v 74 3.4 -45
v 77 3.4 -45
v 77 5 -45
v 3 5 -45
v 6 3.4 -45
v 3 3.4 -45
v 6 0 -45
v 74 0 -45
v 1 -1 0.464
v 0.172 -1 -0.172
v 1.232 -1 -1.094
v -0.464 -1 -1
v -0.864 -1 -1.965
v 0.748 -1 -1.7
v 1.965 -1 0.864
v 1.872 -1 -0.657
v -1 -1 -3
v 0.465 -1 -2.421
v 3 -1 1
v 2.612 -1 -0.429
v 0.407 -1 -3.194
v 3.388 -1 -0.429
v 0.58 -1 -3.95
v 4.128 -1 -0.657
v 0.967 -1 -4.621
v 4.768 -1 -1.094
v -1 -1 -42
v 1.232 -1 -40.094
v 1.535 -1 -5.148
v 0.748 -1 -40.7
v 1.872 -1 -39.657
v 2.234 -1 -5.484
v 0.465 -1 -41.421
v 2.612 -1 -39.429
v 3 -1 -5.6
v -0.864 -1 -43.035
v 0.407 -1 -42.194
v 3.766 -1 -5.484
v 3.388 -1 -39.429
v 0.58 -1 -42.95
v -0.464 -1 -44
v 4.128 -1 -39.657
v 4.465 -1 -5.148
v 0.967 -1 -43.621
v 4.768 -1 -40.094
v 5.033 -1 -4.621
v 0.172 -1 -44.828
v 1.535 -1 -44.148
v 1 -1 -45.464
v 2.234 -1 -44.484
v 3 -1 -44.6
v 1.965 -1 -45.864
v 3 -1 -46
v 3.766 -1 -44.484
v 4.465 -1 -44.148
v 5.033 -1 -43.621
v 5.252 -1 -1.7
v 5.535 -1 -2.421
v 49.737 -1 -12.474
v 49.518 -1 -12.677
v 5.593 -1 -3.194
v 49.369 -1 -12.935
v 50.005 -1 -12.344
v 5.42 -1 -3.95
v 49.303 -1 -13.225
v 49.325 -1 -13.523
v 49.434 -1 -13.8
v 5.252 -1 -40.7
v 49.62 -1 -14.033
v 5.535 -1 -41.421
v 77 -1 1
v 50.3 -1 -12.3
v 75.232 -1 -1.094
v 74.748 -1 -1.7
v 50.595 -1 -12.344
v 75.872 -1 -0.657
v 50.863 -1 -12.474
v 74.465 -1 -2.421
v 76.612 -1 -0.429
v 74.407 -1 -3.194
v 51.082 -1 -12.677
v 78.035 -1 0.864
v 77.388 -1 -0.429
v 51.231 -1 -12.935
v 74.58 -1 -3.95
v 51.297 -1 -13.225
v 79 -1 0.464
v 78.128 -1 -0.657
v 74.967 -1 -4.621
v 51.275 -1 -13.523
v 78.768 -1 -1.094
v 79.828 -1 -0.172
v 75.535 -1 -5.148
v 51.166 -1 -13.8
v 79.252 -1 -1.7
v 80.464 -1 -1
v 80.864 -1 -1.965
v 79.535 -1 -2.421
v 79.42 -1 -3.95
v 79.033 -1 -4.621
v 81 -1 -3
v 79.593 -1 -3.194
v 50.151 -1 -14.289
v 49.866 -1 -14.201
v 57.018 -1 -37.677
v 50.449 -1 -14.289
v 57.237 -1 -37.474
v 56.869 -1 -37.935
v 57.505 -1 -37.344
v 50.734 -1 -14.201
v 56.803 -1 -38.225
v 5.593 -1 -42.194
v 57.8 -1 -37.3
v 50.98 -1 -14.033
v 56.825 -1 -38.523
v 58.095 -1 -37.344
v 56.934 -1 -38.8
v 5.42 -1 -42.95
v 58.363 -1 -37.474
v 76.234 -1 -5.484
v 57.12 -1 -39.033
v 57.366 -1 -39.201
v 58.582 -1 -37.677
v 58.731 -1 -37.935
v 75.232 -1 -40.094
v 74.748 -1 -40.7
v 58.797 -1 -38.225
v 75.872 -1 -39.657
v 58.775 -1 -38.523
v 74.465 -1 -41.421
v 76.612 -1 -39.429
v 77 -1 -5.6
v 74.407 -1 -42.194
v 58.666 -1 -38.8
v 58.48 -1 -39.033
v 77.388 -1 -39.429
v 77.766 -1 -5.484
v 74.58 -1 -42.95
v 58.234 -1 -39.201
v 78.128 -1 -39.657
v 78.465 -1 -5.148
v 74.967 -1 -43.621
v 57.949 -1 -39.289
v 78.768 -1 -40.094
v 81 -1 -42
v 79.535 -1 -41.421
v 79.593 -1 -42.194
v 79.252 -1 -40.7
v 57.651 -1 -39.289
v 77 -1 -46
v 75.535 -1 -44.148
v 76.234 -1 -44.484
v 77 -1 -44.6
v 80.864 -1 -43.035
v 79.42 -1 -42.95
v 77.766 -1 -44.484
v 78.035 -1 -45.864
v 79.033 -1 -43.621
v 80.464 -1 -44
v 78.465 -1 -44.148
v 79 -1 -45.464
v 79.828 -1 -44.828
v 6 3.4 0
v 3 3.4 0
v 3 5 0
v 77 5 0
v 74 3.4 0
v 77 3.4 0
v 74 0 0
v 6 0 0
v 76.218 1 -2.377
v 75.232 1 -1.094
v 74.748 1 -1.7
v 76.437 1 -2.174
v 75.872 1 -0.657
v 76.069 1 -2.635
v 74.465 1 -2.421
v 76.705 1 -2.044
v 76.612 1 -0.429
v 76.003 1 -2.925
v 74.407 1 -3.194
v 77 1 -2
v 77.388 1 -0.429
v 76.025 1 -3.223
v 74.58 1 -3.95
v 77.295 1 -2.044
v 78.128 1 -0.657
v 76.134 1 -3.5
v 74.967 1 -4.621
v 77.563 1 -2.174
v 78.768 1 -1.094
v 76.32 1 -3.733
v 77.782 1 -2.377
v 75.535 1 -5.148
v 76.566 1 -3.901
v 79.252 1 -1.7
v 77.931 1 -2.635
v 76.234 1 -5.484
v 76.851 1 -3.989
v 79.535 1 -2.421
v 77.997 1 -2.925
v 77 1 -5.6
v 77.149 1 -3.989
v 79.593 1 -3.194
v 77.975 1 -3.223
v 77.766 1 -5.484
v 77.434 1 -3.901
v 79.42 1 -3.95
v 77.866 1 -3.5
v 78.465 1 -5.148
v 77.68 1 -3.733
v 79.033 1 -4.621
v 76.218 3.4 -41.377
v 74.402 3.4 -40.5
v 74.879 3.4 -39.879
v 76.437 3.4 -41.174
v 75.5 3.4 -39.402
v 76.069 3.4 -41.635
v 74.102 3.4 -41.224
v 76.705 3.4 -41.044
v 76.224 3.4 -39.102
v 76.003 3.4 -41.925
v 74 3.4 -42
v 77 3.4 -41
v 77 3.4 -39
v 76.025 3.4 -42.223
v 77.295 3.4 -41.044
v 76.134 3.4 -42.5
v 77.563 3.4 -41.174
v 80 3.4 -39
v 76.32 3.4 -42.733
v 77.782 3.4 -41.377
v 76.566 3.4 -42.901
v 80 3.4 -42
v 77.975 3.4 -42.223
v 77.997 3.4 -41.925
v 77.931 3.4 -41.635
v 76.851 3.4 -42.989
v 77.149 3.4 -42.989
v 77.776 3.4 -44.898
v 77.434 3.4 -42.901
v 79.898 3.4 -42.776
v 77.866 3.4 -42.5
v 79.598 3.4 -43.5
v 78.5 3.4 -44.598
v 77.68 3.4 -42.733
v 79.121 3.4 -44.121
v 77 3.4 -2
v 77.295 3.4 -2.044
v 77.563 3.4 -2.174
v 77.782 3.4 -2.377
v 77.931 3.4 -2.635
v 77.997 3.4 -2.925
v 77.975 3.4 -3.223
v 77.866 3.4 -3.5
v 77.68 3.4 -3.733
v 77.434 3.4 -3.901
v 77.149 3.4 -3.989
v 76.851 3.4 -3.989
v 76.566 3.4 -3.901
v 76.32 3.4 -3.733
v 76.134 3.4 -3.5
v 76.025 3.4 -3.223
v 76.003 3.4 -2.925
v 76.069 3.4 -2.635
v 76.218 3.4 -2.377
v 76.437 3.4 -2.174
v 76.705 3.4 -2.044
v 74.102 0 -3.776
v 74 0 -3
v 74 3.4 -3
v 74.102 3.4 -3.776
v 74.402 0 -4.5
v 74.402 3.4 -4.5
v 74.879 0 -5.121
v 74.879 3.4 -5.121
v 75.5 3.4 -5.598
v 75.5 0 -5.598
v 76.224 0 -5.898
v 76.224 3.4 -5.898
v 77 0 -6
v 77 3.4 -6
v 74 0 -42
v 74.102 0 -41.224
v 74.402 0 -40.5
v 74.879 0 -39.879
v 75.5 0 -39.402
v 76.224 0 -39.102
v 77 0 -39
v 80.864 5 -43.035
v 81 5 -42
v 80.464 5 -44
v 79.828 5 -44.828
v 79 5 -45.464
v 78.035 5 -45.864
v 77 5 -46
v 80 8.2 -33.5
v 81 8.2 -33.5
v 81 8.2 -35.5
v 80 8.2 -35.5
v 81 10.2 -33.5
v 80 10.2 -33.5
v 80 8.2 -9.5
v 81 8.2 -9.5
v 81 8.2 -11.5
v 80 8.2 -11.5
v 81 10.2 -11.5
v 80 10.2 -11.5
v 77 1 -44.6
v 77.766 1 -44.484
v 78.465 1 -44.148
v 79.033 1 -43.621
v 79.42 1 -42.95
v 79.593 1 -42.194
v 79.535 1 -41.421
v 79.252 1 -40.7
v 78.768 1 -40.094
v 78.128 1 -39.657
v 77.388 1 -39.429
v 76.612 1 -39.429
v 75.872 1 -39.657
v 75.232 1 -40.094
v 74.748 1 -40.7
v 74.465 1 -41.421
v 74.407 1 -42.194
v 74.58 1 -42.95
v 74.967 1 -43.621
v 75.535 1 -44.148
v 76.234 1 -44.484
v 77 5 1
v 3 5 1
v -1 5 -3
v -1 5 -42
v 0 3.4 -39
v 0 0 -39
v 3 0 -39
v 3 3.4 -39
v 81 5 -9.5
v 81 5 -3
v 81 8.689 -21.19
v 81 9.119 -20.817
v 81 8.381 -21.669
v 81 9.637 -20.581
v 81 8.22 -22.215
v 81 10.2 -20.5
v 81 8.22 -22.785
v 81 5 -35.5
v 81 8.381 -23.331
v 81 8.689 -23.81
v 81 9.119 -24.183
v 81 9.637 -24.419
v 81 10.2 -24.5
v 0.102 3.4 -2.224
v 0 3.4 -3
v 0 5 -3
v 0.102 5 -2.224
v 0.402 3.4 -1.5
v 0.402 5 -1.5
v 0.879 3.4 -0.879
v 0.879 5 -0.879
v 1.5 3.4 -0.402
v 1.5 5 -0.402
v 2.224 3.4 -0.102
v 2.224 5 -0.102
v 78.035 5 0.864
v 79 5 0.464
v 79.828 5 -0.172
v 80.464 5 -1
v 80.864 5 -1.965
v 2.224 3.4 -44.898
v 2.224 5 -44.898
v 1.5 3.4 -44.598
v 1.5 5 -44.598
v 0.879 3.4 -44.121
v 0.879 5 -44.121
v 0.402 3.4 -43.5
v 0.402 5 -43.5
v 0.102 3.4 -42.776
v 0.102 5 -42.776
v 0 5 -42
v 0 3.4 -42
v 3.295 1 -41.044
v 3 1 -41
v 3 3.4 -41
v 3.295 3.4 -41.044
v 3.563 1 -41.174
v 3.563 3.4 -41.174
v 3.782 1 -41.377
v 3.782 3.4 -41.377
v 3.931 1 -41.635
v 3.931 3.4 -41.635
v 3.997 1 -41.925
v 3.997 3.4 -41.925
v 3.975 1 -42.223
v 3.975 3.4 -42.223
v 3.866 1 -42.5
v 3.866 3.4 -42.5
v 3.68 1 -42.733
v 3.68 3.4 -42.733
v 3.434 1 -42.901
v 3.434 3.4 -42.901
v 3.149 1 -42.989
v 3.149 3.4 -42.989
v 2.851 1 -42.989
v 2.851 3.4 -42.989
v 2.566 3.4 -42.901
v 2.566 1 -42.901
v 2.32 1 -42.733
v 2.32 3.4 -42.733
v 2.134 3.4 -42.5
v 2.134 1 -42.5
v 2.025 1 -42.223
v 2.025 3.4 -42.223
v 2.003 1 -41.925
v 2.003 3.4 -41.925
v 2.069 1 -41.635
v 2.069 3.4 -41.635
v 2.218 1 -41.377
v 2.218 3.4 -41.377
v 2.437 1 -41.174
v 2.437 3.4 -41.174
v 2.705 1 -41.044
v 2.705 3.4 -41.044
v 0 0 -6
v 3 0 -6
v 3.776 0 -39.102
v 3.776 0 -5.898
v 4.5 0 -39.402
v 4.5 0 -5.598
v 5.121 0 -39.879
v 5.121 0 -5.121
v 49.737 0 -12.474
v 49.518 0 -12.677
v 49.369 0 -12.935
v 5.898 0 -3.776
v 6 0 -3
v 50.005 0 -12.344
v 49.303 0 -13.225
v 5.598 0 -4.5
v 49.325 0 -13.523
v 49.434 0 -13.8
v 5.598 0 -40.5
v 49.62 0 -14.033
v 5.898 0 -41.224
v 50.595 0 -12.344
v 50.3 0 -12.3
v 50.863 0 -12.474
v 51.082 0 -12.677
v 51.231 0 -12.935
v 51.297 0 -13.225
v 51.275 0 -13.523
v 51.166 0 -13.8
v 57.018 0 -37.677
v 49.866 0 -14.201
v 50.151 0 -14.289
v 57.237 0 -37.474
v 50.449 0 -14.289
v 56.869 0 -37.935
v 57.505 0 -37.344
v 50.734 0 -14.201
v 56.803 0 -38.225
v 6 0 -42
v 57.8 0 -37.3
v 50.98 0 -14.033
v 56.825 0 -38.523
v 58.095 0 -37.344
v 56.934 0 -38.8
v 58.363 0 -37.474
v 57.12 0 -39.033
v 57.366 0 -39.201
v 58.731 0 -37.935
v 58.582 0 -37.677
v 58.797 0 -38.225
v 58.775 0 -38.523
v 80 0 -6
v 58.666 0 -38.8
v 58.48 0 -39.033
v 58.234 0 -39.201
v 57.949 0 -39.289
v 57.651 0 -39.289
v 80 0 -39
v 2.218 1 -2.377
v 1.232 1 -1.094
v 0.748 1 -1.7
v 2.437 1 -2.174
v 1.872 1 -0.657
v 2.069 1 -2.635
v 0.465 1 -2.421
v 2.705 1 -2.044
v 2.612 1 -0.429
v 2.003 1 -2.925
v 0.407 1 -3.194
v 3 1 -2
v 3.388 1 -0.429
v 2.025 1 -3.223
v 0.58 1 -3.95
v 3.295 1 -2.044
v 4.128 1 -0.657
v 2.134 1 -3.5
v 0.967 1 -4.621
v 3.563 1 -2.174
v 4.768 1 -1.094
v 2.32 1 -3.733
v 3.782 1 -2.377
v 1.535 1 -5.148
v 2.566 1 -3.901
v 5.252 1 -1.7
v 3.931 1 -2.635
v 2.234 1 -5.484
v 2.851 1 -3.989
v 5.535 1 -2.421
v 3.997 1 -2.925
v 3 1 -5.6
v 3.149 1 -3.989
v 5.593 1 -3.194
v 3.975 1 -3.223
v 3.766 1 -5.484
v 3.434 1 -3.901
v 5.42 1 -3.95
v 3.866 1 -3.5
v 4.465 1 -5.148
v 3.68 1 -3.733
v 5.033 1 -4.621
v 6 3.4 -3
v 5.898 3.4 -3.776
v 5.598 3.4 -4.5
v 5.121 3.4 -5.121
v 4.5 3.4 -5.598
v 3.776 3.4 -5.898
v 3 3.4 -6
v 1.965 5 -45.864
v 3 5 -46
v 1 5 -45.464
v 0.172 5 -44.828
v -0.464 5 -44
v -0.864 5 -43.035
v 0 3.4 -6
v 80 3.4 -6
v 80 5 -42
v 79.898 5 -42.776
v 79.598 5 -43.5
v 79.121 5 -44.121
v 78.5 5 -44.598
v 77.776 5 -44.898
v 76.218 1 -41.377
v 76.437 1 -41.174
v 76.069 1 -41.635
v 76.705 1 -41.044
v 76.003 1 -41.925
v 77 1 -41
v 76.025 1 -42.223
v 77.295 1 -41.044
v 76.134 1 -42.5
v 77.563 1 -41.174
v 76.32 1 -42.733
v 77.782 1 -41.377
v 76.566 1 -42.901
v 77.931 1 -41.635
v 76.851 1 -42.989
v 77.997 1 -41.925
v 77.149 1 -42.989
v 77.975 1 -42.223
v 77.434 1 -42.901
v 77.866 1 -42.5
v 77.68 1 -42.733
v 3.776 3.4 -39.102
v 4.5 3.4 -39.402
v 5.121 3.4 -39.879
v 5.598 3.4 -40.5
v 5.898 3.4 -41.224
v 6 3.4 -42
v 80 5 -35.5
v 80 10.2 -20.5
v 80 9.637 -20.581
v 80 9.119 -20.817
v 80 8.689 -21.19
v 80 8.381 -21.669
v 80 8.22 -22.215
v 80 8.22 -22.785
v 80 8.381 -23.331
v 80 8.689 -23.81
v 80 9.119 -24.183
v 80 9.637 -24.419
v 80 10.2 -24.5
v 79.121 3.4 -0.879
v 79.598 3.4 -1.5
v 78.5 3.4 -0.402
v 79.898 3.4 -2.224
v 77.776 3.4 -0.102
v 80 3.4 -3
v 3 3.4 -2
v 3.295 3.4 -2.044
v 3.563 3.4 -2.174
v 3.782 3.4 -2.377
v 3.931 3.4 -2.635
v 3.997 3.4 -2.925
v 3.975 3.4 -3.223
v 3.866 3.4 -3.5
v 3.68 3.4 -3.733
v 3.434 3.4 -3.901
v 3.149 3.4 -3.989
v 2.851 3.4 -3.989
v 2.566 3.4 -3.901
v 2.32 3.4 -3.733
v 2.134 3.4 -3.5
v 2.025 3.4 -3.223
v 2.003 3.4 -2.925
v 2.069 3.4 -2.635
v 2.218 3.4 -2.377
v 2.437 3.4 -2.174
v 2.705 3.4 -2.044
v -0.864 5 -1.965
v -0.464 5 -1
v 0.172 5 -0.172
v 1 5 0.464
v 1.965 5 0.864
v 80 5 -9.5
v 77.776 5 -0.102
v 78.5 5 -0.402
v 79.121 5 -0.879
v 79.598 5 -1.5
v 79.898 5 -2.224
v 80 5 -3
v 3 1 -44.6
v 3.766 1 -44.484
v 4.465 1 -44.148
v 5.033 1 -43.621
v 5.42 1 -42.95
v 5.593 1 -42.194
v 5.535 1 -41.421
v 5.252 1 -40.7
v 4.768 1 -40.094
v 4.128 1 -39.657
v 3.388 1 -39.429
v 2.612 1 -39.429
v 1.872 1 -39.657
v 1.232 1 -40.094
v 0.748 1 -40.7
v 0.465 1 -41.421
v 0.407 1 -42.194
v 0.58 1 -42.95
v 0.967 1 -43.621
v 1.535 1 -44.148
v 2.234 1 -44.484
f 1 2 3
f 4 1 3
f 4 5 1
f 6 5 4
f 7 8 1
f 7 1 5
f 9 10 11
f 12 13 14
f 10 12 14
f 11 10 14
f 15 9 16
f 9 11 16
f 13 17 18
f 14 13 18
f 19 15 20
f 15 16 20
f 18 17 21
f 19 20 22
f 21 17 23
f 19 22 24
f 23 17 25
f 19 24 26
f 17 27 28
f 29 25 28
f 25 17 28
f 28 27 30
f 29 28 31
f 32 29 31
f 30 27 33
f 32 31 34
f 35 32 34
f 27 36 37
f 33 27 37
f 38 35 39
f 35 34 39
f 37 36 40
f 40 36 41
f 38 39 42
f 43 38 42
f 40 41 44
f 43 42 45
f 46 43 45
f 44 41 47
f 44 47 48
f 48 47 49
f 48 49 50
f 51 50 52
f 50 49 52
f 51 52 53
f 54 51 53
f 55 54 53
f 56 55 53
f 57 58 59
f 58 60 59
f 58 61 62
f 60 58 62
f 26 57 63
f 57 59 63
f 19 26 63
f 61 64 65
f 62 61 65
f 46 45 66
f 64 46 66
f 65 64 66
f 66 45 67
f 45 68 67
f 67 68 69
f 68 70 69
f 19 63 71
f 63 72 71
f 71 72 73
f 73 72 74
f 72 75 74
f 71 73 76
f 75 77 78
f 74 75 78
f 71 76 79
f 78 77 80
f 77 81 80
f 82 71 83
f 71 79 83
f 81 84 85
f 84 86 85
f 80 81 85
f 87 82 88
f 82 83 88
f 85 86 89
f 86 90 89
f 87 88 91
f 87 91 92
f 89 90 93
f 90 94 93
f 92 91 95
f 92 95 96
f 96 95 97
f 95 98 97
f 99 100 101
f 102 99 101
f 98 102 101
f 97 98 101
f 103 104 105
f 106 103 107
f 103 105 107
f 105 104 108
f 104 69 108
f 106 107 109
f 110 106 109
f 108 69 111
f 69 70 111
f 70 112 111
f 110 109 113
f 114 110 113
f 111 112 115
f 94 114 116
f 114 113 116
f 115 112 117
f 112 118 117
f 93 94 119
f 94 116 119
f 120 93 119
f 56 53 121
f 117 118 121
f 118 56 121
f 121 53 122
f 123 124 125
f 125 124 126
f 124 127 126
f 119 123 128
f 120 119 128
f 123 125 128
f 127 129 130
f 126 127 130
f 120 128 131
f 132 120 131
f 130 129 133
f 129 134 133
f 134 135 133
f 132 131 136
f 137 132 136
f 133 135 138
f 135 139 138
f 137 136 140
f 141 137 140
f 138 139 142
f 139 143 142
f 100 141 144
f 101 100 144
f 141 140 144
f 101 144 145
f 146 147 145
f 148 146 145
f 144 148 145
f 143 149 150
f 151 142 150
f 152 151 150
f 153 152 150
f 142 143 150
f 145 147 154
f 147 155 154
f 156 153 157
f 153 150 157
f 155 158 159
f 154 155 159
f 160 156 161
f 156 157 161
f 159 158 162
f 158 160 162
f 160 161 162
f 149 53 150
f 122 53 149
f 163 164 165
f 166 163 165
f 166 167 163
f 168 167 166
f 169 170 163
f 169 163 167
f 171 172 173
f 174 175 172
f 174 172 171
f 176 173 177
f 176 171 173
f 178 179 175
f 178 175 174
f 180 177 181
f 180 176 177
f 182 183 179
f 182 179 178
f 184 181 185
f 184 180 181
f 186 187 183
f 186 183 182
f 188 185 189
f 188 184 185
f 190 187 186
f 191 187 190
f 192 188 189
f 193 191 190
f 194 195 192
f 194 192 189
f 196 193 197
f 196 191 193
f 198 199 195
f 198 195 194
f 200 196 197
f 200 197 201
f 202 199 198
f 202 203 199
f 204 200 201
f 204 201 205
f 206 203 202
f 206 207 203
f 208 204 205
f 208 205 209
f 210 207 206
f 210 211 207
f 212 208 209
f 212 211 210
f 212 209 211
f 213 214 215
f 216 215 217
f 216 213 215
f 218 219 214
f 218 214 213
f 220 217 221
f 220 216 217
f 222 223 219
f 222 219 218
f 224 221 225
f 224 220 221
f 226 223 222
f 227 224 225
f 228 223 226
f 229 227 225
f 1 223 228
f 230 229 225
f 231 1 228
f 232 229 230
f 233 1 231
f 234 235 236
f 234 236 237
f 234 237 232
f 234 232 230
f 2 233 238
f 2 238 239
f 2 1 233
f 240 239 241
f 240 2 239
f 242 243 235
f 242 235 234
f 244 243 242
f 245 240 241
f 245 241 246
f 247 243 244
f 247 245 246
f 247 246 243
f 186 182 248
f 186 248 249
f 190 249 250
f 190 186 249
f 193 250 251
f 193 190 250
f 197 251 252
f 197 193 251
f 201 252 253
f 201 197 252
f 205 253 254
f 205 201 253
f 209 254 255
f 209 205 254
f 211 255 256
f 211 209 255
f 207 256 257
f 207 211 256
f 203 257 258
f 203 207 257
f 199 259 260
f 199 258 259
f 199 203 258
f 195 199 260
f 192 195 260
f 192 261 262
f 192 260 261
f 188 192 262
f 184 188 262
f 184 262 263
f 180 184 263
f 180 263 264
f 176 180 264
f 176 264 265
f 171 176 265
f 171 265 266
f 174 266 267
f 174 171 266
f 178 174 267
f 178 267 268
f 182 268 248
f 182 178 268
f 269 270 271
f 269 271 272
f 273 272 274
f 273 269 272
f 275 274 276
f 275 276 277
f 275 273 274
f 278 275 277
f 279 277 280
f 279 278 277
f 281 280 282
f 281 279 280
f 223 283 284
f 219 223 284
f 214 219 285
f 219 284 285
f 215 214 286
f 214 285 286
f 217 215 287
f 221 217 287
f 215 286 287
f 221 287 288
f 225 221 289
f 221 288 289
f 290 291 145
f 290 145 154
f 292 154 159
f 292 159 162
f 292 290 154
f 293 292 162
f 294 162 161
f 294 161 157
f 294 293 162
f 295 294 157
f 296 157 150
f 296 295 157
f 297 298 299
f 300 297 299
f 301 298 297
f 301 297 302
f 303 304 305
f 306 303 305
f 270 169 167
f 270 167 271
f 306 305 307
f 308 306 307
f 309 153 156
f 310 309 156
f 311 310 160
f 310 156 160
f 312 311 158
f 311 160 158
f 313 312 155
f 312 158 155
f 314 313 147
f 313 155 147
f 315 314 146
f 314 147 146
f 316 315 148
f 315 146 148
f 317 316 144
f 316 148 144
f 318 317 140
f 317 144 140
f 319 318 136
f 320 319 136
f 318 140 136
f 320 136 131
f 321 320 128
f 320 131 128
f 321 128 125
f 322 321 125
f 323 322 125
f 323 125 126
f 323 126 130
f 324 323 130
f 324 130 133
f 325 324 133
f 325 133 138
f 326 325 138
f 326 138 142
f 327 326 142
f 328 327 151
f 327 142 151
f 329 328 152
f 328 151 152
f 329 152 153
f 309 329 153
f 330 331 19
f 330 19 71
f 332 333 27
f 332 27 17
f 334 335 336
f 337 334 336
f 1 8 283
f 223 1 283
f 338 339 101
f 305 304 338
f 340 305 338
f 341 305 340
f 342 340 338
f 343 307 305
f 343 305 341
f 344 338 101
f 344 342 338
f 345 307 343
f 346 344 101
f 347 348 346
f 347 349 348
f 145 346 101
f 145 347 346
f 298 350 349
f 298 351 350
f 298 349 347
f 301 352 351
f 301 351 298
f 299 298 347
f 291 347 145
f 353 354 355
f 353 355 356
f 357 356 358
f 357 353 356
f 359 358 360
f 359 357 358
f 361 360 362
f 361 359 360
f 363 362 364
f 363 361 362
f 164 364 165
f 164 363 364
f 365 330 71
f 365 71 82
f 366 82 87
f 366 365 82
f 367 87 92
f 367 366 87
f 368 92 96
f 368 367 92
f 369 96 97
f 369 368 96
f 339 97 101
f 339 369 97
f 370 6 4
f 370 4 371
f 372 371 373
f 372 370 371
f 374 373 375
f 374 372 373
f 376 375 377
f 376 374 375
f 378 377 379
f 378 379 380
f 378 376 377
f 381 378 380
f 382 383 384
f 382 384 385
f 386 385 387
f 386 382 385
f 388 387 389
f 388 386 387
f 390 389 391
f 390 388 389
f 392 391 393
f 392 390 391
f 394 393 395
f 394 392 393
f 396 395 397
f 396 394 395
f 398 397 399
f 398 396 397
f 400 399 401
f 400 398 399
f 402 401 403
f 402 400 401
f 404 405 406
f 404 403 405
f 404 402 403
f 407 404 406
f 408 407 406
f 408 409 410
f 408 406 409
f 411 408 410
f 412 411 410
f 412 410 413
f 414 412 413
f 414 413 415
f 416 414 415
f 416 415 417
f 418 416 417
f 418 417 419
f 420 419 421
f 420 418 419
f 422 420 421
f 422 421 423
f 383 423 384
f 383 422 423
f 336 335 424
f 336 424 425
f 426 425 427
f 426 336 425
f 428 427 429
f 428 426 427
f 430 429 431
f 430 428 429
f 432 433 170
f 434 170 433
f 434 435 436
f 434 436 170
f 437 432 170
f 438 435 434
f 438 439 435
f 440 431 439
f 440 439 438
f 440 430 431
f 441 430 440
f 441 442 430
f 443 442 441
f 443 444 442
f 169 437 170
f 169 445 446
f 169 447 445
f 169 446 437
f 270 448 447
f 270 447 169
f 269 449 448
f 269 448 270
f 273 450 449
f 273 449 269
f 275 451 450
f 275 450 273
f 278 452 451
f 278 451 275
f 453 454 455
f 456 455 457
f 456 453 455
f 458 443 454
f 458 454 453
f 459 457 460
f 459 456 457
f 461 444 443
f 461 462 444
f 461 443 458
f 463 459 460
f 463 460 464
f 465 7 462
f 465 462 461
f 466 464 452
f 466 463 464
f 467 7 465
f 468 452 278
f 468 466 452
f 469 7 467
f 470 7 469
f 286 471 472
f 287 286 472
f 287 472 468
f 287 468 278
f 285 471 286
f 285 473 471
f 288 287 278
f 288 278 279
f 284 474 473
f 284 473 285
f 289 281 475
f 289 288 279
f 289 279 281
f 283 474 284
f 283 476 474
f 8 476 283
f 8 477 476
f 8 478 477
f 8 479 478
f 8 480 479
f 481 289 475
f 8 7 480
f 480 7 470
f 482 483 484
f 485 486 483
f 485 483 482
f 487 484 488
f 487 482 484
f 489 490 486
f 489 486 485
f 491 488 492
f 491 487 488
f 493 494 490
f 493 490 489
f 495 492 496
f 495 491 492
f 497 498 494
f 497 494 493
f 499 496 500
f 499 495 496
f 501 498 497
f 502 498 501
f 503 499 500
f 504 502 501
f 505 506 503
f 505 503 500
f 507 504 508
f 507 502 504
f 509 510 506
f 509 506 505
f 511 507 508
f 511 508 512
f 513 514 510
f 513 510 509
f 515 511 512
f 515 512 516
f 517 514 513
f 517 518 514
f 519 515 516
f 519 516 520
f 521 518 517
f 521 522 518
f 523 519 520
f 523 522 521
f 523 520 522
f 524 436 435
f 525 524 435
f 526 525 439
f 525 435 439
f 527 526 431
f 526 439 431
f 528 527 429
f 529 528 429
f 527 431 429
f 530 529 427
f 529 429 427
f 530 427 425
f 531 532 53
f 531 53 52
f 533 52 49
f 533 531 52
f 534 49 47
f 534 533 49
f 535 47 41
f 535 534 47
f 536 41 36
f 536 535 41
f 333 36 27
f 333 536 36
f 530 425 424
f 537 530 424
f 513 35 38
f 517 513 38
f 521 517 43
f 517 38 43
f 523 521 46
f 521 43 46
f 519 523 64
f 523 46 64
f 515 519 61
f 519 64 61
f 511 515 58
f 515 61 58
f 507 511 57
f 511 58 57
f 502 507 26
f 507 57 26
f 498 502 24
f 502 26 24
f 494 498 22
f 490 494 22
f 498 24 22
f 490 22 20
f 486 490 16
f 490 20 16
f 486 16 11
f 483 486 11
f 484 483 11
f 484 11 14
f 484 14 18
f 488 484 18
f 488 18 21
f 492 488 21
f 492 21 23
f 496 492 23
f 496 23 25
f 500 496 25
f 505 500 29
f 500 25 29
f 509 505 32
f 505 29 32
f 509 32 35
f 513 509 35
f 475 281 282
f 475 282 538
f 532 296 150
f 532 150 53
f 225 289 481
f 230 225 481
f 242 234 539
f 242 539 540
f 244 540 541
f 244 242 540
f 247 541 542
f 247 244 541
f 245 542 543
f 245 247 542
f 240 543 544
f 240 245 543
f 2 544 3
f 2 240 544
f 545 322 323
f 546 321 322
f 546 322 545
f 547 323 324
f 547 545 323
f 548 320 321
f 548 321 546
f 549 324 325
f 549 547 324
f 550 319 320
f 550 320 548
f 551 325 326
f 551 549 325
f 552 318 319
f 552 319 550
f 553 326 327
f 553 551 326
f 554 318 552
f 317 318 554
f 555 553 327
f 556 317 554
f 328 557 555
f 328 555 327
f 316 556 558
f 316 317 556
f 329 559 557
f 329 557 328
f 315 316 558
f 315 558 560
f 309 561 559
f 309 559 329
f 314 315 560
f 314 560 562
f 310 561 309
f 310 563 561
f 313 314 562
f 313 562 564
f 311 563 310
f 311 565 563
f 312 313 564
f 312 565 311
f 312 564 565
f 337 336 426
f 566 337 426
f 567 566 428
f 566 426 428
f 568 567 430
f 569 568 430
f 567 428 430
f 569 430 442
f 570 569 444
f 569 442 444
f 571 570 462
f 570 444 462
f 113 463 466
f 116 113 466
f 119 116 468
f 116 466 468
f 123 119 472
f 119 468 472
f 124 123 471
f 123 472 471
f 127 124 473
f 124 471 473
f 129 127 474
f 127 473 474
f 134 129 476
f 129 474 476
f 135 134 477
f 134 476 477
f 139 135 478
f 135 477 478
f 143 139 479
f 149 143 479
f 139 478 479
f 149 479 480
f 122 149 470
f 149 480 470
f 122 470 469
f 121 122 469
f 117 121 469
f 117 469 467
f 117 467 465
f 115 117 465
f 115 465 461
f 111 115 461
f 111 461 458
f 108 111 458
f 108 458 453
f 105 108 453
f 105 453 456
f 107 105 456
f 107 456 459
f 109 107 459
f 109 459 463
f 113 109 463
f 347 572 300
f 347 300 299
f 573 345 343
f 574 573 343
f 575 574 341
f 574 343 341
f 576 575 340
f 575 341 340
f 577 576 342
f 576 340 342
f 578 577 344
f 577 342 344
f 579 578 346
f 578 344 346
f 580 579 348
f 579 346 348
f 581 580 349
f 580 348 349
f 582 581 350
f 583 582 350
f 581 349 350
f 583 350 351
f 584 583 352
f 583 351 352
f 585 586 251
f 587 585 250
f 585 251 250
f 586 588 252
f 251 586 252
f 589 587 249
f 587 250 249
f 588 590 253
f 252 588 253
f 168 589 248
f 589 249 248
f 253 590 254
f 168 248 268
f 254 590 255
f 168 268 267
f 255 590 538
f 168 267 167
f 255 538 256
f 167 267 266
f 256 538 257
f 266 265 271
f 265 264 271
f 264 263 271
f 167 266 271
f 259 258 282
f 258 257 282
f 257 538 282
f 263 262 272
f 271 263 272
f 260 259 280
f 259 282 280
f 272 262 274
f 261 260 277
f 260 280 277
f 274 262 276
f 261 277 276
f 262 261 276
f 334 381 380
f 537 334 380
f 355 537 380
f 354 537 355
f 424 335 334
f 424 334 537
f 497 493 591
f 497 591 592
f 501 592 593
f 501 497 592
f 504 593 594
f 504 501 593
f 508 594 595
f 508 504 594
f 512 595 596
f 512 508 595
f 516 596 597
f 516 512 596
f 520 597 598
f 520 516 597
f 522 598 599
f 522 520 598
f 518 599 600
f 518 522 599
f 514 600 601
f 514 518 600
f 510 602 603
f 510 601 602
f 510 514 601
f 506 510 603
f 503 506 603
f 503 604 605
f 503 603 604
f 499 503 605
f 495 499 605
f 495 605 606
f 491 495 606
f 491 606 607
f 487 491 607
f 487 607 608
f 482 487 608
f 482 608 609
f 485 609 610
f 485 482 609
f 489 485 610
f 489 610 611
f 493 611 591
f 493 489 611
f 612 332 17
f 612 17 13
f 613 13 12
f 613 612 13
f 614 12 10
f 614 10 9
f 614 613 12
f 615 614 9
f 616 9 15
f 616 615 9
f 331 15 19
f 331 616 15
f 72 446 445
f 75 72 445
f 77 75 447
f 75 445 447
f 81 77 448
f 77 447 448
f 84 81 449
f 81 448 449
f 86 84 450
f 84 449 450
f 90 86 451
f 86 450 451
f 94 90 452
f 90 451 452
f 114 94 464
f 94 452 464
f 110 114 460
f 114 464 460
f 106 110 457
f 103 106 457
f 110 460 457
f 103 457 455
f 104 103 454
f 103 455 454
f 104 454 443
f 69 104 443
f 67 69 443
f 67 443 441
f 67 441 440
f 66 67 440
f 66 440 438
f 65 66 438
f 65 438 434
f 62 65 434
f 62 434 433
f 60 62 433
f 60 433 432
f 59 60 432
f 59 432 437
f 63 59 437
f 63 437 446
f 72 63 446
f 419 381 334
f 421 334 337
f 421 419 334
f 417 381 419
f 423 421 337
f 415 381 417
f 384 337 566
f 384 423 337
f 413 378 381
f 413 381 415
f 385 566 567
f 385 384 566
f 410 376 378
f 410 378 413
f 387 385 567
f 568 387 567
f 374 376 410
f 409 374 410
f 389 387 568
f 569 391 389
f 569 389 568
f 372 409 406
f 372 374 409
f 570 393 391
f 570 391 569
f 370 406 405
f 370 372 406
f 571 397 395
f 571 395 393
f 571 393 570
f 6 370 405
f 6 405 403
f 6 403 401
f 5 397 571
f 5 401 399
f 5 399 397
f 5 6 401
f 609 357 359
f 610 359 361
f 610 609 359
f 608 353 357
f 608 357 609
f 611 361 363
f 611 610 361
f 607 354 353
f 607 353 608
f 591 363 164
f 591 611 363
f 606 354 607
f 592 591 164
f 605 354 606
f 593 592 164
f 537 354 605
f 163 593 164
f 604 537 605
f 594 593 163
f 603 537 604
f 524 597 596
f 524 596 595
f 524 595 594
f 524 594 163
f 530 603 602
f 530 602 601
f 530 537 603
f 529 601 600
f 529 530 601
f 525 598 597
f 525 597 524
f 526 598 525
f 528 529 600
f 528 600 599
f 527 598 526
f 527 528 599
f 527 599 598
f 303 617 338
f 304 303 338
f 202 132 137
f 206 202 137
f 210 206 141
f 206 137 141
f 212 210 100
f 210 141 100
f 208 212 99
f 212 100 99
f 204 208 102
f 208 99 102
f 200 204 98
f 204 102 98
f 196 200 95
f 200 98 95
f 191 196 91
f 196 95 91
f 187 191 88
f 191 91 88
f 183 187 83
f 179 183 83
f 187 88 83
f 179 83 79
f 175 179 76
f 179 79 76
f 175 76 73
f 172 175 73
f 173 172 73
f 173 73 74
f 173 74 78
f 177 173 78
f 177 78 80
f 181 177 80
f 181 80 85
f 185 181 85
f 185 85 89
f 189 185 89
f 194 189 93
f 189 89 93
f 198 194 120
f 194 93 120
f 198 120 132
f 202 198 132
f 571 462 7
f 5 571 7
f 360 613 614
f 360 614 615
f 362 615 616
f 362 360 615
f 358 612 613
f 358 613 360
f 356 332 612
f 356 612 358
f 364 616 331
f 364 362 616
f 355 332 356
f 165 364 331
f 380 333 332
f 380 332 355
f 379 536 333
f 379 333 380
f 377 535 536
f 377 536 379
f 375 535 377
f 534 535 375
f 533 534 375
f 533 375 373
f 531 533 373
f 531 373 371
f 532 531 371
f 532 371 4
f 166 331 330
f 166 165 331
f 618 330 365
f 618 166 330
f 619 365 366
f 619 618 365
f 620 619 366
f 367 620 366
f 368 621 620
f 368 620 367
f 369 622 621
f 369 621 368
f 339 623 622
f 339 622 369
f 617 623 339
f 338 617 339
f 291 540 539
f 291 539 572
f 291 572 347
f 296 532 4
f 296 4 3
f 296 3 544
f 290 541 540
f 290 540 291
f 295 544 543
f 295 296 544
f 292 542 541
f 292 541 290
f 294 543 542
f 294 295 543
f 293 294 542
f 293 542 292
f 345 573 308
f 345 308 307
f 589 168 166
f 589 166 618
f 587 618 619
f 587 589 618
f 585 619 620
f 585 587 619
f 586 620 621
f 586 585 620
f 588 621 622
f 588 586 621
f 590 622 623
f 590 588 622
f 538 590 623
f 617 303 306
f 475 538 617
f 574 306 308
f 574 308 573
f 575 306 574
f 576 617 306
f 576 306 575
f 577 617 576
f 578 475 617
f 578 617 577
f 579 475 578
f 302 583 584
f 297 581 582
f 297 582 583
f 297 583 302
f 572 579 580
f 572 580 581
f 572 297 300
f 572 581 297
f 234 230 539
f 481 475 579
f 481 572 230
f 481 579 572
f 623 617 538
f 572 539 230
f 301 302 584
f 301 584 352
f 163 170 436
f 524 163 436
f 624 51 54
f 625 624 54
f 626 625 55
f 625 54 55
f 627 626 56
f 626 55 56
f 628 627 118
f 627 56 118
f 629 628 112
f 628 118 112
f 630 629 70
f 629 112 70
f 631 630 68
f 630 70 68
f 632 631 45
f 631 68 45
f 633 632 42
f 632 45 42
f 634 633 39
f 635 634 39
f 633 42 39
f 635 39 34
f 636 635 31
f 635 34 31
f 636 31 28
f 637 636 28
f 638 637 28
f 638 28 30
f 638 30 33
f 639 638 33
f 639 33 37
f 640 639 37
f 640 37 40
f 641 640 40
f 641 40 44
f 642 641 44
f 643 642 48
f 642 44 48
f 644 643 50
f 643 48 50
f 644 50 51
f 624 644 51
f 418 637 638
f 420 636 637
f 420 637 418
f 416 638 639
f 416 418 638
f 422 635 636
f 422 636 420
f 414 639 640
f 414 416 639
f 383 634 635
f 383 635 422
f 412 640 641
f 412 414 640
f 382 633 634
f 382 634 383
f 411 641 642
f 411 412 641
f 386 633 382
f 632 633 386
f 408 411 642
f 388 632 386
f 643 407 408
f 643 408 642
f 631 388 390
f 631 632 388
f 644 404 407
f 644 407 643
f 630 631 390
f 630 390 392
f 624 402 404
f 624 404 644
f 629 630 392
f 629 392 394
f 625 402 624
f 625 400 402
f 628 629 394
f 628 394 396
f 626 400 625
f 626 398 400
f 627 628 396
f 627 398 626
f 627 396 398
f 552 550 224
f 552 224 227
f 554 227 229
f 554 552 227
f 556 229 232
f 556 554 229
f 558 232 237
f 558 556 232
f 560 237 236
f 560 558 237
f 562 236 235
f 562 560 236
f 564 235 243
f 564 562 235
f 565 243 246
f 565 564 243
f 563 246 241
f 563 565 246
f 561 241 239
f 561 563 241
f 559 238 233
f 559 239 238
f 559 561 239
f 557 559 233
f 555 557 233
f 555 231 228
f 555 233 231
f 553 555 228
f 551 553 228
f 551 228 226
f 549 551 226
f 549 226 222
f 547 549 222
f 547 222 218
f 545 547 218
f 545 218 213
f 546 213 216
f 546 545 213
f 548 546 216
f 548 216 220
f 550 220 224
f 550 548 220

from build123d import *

# Parameters (mm, degrees)
EXTRUDE_1_DEPTH          = 1
EXTRUDE_START            = 5
EXTRUDE_2_DEPTH          = 5
CUT_EXTRUDE_2_DEPTH      = 5
EXTRUDE_3_DEPTH          = 3.4
CUT_EXTRUDE_3_DEPTH      = 94.28451104
CUT_EXTRUDE_3_DEPTH_BACK = 94.28451104
SKETCH_4_R               = 1
SKETCH_7_R               = 1
CUT_EXTRUDE_8_DEPTH      = 94.28451104
SKETCH_8_R               = 2.6
CUT_EXTRUDE_9_DEPTH      = 2
SKETCH_9_W               = 1
SKETCH_9_H               = 26
EXTRUDE_4_DEPTH          = 5.2
CUT_EXTRUDE_11_REACH     = 96.573
SKETCH_10_R              = 2
SKETCH_10_W              = 2
SKETCH_10_H              = 4


with BuildPart() as part:
    # 草图1 → 凸台-拉伸1 (new body)
    with BuildSketch(Plane(origin=(0, 0, 0), x_dir=(1, 0, 0), z_dir=(0, 1, 0))):
        with BuildLine():
            Line((3, -1), (77, -1))
            ThreePointArc((77, -1), (79.828427125, 0.171572875), (81, 3))
            Line((81, 3), (81, 42))
            ThreePointArc((81, 42), (79.828427125, 44.828427125), (77, 46))
            Line((77, 46), (3, 46))
            ThreePointArc((3, 46), (0.171572875, 44.828427125), (-1, 42))
            Line((-1, 42), (-1, 3))
            ThreePointArc((-1, 3), (0.171572875, 0.171572875), (3, -1))
        make_face()
    extrude(amount=-EXTRUDE_1_DEPTH)

    # 草图1<3> → 凸台-拉伸2 (add)
    with BuildSketch(Plane(origin=(0, 0, 0), x_dir=(1, 0, 0), z_dir=(0, 1, 0)).offset(EXTRUDE_START)):
        with BuildLine():
            Line((3, -1), (77, -1))
            ThreePointArc((77, -1), (79.828427125, 0.171572875), (81, 3))
            Line((81, 3), (81, 42))
            ThreePointArc((81, 42), (79.828427125, 44.828427125), (77, 46))
            Line((77, 46), (3, 46))
            ThreePointArc((3, 46), (0.171572875, 44.828427125), (-1, 42))
            Line((-1, 42), (-1, 3))
            ThreePointArc((-1, 3), (0.171572875, 0.171572875), (3, -1))
        make_face()
    extrude(amount=-EXTRUDE_2_DEPTH)

    # 草图6 → 切除-拉伸2 (cut)
    with BuildSketch(Plane(origin=(0, 0, 0), x_dir=(1, 0, 0), z_dir=(0, 1, 0))):
        with BuildLine():
            Line((80, 3), (80, 42))
            ThreePointArc((80, 42), (79.121320344, 44.121320344), (77, 45))
            Line((77, 45), (3, 45))
            ThreePointArc((3, 45), (0.878679656, 44.121320344), (0, 42))
            Line((0, 42), (0, 3))
            ThreePointArc((0, 3), (0.878679656, 0.878679656), (3, 0))
            Line((3, 0), (77, 0))
            ThreePointArc((77, 0), (79.121320344, 0.878679656), (80, 3))
        make_face()
    extrude(amount=CUT_EXTRUDE_2_DEPTH, mode=Mode.SUBTRACT)

    # 草图5 → 凸台-拉伸3 (add)
    with BuildSketch(Plane(origin=(0, 0, 0), x_dir=(1, 0, 0), z_dir=(0, 1, 0))):
        with BuildLine():
            Line((77, 6), (80, 6))
            Line((80, 6), (80, 3))
            ThreePointArc((80, 3), (79.121320344, 0.878679656), (77, 0))
            Line((77, 0), (74, 0))
            Line((74, 0), (74, 3))
            ThreePointArc((74, 3), (74.878679656, 5.121320344), (77, 6))
        make_face()
        with BuildLine():
            Line((77, 45), (74, 45))
            Line((74, 45), (74, 42))
            ThreePointArc((74, 42), (74.878679656, 39.878679656), (77, 39))
            Line((77, 39), (80, 39))
            Line((80, 39), (80, 42))
            ThreePointArc((80, 42), (79.121320344, 44.121320344), (77, 45))
        make_face()
        with BuildLine():
            Line((0, 42), (0, 39))
            Line((0, 39), (3, 39))
            ThreePointArc((3, 39), (5.121320344, 39.878679656), (6, 42))
            Line((6, 42), (6, 45))
            Line((6, 45), (3, 45))
            ThreePointArc((3, 45), (0.878679656, 44.121320344), (0, 42))
        make_face()
        with BuildLine():
            Line((3, 6), (0, 6))
            Line((0, 6), (0, 3))
            ThreePointArc((0, 3), (0.878679656, 0.878679656), (3, 0))
            Line((3, 0), (6, 0))
            Line((6, 0), (6, 3))
            ThreePointArc((6, 3), (5.121320344, 5.121320344), (3, 6))
        make_face()
    extrude(amount=EXTRUDE_3_DEPTH)

    # 草图4 → 切除-拉伸3 (cut, two sides: drawn at the far end of the back side and taken through both)
    with BuildSketch(Plane(origin=(0, 0, 0), x_dir=(1, 0, 0), z_dir=(0, 1, 0)).offset(-CUT_EXTRUDE_3_DEPTH_BACK)):
        with Locations((3, 42)):
            Circle(SKETCH_4_R)
        with Locations((3, 3)):
            Circle(SKETCH_4_R)
        with Locations((77, 3)):
            Circle(SKETCH_4_R)
        with Locations((77, 42)):
            Circle(SKETCH_4_R)
    extrude(amount=CUT_EXTRUDE_3_DEPTH + CUT_EXTRUDE_3_DEPTH_BACK, mode=Mode.SUBTRACT)

    # 草图7 → 切除-拉伸8 (cut, through all)
    with BuildSketch(Plane(origin=(0, 0, 0), x_dir=(1, 0, 0), z_dir=(0, 1, 0))):
        with Locations((50.3, 13.3)):
            Circle(SKETCH_7_R)
        with Locations((57.8, 38.3)):
            Circle(SKETCH_7_R)
    extrude(amount=-CUT_EXTRUDE_8_DEPTH, mode=Mode.SUBTRACT)

    # 草图8 → 切除-拉伸9 (cut)
    with BuildSketch(Plane.XZ.offset(1)):
        with Locations((3, -3)):
            Circle(SKETCH_8_R)
        with Locations((77, -3)):
            Circle(SKETCH_8_R)
        with Locations((3, -42)):
            Circle(SKETCH_8_R)
        with Locations((77, -42)):
            Circle(SKETCH_8_R)
    extrude(amount=-CUT_EXTRUDE_9_DEPTH, mode=Mode.SUBTRACT)

    # 草图9 → 凸台-拉伸4 (add)
    with BuildSketch(Plane(origin=(0, 5, 0), x_dir=(1, 0, 0), z_dir=(0, 1, 0))):
        with Locations((80.5, 22.5)):
            Rectangle(SKETCH_9_W, SKETCH_9_H)
    extrude(amount=EXTRUDE_4_DEPTH)

    # 草图10 → 切除-拉伸11 (cut, up to next)
    with BuildSketch(Plane(origin=(81, 0, 0), x_dir=(0, 0, -1), z_dir=(1, 0, 0)), mode=Mode.PRIVATE) as cut_extrude_11_sk1:
        with Locations((22.5, 10.2)):
            Circle(SKETCH_10_R)
    cut_extrude_11_tool1 = extrude(cut_extrude_11_sk1.sketch, amount=-CUT_EXTRUDE_11_REACH, mode=Mode.PRIVATE) & part.part
    # 草图10 → 切除-拉伸11 (cut, up to next)
    with BuildSketch(Plane(origin=(81, 0, 0), x_dir=(0, 0, -1), z_dir=(1, 0, 0)), mode=Mode.PRIVATE) as cut_extrude_11_sk2:
        with Locations((10.5, 10.2)):
            Rectangle(SKETCH_10_W, SKETCH_10_H)
    cut_extrude_11_tool2 = extrude(cut_extrude_11_sk2.sketch, amount=-CUT_EXTRUDE_11_REACH, mode=Mode.PRIVATE) & part.part
    # 草图10 → 切除-拉伸11 (cut, up to next)
    with BuildSketch(Plane(origin=(81, 0, 0), x_dir=(0, 0, -1), z_dir=(1, 0, 0)), mode=Mode.PRIVATE) as cut_extrude_11_sk3:
        with Locations((34.5, 10.2)):
            Rectangle(SKETCH_10_W, SKETCH_10_H)
    cut_extrude_11_tool3 = extrude(cut_extrude_11_sk3.sketch, amount=-CUT_EXTRUDE_11_REACH, mode=Mode.PRIVATE) & part.part
    add(cut_extrude_11_tool1.solids().sort_by_distance((81, 10.2, -22.5))[0], mode=Mode.SUBTRACT)
    add(cut_extrude_11_tool2.solids().sort_by_distance((81, 10.2, -10.5))[0], mode=Mode.SUBTRACT)
    add(cut_extrude_11_tool3.solids().sort_by_distance((81, 10.2, -34.5))[0], mode=Mode.SUBTRACT)


solid = part.part
